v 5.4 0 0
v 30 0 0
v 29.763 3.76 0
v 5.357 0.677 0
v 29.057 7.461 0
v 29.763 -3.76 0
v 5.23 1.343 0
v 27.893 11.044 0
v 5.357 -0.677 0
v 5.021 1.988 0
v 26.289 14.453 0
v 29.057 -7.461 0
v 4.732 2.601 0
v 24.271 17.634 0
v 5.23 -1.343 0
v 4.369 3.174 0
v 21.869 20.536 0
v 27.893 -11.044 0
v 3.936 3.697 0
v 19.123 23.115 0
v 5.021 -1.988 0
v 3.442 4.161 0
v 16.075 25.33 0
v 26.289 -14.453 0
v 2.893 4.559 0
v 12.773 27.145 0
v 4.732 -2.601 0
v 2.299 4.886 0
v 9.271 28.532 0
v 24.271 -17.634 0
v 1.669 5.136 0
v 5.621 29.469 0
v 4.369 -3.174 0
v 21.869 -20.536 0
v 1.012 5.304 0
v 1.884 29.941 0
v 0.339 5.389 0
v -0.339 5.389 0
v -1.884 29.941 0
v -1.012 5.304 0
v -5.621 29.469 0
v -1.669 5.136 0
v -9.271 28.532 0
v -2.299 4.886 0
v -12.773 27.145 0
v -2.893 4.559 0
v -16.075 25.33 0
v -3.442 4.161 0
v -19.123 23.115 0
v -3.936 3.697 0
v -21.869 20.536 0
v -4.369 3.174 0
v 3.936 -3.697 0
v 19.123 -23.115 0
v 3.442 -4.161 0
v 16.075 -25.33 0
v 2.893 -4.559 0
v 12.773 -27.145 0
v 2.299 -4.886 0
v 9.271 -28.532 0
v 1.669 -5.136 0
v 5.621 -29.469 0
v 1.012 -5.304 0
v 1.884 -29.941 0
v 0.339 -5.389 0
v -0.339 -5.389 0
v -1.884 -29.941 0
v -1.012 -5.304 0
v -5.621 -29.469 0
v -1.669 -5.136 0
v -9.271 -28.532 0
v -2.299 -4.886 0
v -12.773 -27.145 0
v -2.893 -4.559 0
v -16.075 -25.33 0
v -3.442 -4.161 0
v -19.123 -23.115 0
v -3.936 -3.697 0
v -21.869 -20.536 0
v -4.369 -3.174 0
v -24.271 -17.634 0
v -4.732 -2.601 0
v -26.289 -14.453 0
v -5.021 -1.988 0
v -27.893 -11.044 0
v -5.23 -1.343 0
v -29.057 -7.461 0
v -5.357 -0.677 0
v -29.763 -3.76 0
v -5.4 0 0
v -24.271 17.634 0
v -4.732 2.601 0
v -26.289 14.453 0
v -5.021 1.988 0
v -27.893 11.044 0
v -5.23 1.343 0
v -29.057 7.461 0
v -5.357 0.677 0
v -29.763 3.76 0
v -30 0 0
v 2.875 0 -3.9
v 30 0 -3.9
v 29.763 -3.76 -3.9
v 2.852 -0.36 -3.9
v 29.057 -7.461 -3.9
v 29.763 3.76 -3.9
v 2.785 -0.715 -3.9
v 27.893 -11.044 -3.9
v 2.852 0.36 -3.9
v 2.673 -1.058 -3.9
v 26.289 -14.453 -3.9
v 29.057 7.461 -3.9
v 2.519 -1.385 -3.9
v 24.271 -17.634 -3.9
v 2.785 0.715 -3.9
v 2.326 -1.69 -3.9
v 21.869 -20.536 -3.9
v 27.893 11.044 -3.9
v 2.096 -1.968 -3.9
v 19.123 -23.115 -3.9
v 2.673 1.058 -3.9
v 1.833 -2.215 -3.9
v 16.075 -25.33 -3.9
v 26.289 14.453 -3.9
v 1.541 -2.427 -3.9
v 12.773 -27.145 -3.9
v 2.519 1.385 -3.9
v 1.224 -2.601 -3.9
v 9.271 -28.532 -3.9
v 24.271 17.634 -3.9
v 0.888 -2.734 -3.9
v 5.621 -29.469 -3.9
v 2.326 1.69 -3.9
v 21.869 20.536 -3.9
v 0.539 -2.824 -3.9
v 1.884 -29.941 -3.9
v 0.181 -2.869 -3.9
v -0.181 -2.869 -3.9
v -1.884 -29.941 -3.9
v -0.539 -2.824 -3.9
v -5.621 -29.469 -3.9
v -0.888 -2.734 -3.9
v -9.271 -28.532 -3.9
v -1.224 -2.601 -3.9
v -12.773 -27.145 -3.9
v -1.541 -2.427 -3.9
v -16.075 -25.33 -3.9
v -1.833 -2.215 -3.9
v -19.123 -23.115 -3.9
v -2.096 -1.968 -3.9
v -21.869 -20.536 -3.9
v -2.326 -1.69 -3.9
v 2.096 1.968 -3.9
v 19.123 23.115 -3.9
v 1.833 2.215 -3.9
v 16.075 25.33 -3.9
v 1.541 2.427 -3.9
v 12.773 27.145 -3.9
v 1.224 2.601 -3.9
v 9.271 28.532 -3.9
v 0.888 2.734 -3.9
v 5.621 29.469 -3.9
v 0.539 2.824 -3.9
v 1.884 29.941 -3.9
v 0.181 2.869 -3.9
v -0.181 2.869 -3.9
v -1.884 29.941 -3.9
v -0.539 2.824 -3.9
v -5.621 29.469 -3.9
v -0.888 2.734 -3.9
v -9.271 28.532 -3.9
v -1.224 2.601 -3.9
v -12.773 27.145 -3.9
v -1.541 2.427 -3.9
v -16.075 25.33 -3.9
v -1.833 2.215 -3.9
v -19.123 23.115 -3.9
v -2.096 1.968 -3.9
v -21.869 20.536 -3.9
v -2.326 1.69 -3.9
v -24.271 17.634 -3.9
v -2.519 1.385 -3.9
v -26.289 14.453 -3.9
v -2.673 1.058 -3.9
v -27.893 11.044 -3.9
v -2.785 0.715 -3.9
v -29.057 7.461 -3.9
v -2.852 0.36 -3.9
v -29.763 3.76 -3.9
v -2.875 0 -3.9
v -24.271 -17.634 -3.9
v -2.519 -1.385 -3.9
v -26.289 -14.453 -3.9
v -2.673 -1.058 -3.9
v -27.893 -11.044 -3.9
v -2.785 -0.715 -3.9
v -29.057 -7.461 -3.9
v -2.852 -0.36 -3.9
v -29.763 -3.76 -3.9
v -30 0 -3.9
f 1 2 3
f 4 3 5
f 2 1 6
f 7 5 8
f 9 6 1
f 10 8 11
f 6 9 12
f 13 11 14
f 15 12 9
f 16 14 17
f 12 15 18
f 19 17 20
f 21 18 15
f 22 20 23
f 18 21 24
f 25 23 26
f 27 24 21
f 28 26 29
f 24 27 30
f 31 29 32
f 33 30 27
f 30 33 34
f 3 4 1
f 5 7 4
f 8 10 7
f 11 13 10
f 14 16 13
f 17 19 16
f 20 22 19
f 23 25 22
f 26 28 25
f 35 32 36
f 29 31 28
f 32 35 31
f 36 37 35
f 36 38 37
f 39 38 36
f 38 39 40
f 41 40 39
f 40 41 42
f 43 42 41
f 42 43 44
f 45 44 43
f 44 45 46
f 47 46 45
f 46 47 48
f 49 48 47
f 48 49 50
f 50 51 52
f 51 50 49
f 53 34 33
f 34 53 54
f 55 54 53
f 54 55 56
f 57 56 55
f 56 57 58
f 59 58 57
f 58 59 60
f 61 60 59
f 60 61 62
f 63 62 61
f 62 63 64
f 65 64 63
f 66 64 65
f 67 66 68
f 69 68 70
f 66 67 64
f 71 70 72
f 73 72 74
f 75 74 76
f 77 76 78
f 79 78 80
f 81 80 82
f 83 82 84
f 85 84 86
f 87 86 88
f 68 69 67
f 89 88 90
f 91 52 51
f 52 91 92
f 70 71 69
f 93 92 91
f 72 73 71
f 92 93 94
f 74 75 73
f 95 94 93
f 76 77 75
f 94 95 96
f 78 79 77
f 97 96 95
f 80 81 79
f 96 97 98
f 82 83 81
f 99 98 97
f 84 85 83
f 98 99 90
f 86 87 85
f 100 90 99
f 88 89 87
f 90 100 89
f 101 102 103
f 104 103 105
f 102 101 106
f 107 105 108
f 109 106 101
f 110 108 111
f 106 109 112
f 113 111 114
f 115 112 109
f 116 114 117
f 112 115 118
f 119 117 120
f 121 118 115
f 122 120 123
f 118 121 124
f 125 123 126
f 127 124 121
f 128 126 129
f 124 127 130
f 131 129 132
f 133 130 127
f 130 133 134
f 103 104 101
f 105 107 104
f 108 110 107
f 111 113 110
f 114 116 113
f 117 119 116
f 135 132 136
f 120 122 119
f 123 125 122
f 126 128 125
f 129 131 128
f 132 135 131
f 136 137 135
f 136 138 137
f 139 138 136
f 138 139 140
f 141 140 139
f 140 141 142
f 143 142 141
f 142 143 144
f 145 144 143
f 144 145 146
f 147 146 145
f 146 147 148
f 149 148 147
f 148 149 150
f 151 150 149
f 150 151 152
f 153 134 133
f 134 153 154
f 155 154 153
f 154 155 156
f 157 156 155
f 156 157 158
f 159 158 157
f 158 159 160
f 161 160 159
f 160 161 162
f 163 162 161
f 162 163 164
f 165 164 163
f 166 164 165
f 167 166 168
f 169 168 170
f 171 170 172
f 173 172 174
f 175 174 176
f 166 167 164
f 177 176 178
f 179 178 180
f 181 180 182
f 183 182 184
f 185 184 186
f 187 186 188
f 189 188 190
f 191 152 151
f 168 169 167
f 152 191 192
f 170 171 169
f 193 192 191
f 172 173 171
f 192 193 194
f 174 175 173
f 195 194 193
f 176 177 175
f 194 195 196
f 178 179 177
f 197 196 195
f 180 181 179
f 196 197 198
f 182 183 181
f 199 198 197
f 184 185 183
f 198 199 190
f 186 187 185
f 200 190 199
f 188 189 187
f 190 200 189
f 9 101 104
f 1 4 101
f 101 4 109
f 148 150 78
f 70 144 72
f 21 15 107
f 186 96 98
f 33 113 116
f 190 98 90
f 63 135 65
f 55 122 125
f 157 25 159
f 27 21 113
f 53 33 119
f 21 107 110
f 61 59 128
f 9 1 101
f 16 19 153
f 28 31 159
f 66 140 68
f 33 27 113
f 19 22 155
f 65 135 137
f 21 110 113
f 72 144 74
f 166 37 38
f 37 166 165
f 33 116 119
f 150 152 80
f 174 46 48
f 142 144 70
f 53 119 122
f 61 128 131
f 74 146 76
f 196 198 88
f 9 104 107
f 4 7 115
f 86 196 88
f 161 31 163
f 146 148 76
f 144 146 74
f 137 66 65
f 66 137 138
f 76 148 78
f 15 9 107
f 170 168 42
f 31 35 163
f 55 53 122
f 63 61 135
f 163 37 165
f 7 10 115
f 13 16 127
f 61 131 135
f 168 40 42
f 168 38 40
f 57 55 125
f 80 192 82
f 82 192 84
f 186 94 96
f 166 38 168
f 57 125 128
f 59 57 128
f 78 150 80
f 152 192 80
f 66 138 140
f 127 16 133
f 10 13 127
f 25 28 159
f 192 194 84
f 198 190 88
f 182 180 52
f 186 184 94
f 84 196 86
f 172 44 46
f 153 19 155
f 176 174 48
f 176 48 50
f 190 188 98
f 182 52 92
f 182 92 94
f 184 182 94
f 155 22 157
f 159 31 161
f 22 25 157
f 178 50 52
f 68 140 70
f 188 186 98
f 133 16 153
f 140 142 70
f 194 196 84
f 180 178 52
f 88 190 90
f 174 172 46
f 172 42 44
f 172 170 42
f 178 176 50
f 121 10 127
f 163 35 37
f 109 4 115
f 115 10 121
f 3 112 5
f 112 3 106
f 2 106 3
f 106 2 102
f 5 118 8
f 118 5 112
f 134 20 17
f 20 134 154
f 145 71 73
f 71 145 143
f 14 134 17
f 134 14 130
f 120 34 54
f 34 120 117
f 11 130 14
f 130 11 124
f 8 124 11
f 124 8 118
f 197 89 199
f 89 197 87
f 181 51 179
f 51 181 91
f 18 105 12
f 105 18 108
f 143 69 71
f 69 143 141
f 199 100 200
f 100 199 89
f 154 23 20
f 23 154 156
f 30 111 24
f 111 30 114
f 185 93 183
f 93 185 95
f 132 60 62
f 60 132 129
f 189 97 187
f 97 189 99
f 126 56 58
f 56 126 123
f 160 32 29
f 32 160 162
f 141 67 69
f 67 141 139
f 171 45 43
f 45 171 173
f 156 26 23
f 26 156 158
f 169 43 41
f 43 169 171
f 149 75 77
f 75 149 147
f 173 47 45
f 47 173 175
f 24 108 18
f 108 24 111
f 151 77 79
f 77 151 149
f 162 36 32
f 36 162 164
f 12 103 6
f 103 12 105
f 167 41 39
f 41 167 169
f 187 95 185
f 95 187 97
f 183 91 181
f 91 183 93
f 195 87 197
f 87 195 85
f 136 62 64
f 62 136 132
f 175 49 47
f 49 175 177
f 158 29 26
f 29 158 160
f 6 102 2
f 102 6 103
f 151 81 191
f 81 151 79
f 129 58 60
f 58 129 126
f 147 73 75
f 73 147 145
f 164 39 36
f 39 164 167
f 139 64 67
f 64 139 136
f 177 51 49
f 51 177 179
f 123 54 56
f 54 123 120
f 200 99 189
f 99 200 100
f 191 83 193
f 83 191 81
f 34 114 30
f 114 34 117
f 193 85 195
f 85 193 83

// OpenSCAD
$fn = 50;


difference() {
	union() {
		translate(v = [0, 0, -3.9000000000]) {
			cylinder(h = 3.9000000000, r = 30.0000000000);
		}
	}
	union() {
		translate(v = [0, 0, 0]) {
			rotate(a = [0, 0, 0]) {
				difference() {
					union() {
						translate(v = [0, 0, -3.9000000000]) {
							cylinder(h = 3.9000000000, r = 2.6000000000);
						}
						translate(v = [0, 0, -3.9000000000]) {
							cylinder(h = 3.9000000000, r1 = 2.8750000000, r2 = 5.4000000000);
						}
						translate(v = [0, 0, -3.9000000000]) {
							cylinder(h = 3.9000000000, r = 2.8750000000);
						}
						translate(v = [0, 0, -3.9000000000]) {
							cylinder(h = 3.9000000000, r = 2.6000000000);
						}
					}
					union();
				}
			}
		}
	}
}
